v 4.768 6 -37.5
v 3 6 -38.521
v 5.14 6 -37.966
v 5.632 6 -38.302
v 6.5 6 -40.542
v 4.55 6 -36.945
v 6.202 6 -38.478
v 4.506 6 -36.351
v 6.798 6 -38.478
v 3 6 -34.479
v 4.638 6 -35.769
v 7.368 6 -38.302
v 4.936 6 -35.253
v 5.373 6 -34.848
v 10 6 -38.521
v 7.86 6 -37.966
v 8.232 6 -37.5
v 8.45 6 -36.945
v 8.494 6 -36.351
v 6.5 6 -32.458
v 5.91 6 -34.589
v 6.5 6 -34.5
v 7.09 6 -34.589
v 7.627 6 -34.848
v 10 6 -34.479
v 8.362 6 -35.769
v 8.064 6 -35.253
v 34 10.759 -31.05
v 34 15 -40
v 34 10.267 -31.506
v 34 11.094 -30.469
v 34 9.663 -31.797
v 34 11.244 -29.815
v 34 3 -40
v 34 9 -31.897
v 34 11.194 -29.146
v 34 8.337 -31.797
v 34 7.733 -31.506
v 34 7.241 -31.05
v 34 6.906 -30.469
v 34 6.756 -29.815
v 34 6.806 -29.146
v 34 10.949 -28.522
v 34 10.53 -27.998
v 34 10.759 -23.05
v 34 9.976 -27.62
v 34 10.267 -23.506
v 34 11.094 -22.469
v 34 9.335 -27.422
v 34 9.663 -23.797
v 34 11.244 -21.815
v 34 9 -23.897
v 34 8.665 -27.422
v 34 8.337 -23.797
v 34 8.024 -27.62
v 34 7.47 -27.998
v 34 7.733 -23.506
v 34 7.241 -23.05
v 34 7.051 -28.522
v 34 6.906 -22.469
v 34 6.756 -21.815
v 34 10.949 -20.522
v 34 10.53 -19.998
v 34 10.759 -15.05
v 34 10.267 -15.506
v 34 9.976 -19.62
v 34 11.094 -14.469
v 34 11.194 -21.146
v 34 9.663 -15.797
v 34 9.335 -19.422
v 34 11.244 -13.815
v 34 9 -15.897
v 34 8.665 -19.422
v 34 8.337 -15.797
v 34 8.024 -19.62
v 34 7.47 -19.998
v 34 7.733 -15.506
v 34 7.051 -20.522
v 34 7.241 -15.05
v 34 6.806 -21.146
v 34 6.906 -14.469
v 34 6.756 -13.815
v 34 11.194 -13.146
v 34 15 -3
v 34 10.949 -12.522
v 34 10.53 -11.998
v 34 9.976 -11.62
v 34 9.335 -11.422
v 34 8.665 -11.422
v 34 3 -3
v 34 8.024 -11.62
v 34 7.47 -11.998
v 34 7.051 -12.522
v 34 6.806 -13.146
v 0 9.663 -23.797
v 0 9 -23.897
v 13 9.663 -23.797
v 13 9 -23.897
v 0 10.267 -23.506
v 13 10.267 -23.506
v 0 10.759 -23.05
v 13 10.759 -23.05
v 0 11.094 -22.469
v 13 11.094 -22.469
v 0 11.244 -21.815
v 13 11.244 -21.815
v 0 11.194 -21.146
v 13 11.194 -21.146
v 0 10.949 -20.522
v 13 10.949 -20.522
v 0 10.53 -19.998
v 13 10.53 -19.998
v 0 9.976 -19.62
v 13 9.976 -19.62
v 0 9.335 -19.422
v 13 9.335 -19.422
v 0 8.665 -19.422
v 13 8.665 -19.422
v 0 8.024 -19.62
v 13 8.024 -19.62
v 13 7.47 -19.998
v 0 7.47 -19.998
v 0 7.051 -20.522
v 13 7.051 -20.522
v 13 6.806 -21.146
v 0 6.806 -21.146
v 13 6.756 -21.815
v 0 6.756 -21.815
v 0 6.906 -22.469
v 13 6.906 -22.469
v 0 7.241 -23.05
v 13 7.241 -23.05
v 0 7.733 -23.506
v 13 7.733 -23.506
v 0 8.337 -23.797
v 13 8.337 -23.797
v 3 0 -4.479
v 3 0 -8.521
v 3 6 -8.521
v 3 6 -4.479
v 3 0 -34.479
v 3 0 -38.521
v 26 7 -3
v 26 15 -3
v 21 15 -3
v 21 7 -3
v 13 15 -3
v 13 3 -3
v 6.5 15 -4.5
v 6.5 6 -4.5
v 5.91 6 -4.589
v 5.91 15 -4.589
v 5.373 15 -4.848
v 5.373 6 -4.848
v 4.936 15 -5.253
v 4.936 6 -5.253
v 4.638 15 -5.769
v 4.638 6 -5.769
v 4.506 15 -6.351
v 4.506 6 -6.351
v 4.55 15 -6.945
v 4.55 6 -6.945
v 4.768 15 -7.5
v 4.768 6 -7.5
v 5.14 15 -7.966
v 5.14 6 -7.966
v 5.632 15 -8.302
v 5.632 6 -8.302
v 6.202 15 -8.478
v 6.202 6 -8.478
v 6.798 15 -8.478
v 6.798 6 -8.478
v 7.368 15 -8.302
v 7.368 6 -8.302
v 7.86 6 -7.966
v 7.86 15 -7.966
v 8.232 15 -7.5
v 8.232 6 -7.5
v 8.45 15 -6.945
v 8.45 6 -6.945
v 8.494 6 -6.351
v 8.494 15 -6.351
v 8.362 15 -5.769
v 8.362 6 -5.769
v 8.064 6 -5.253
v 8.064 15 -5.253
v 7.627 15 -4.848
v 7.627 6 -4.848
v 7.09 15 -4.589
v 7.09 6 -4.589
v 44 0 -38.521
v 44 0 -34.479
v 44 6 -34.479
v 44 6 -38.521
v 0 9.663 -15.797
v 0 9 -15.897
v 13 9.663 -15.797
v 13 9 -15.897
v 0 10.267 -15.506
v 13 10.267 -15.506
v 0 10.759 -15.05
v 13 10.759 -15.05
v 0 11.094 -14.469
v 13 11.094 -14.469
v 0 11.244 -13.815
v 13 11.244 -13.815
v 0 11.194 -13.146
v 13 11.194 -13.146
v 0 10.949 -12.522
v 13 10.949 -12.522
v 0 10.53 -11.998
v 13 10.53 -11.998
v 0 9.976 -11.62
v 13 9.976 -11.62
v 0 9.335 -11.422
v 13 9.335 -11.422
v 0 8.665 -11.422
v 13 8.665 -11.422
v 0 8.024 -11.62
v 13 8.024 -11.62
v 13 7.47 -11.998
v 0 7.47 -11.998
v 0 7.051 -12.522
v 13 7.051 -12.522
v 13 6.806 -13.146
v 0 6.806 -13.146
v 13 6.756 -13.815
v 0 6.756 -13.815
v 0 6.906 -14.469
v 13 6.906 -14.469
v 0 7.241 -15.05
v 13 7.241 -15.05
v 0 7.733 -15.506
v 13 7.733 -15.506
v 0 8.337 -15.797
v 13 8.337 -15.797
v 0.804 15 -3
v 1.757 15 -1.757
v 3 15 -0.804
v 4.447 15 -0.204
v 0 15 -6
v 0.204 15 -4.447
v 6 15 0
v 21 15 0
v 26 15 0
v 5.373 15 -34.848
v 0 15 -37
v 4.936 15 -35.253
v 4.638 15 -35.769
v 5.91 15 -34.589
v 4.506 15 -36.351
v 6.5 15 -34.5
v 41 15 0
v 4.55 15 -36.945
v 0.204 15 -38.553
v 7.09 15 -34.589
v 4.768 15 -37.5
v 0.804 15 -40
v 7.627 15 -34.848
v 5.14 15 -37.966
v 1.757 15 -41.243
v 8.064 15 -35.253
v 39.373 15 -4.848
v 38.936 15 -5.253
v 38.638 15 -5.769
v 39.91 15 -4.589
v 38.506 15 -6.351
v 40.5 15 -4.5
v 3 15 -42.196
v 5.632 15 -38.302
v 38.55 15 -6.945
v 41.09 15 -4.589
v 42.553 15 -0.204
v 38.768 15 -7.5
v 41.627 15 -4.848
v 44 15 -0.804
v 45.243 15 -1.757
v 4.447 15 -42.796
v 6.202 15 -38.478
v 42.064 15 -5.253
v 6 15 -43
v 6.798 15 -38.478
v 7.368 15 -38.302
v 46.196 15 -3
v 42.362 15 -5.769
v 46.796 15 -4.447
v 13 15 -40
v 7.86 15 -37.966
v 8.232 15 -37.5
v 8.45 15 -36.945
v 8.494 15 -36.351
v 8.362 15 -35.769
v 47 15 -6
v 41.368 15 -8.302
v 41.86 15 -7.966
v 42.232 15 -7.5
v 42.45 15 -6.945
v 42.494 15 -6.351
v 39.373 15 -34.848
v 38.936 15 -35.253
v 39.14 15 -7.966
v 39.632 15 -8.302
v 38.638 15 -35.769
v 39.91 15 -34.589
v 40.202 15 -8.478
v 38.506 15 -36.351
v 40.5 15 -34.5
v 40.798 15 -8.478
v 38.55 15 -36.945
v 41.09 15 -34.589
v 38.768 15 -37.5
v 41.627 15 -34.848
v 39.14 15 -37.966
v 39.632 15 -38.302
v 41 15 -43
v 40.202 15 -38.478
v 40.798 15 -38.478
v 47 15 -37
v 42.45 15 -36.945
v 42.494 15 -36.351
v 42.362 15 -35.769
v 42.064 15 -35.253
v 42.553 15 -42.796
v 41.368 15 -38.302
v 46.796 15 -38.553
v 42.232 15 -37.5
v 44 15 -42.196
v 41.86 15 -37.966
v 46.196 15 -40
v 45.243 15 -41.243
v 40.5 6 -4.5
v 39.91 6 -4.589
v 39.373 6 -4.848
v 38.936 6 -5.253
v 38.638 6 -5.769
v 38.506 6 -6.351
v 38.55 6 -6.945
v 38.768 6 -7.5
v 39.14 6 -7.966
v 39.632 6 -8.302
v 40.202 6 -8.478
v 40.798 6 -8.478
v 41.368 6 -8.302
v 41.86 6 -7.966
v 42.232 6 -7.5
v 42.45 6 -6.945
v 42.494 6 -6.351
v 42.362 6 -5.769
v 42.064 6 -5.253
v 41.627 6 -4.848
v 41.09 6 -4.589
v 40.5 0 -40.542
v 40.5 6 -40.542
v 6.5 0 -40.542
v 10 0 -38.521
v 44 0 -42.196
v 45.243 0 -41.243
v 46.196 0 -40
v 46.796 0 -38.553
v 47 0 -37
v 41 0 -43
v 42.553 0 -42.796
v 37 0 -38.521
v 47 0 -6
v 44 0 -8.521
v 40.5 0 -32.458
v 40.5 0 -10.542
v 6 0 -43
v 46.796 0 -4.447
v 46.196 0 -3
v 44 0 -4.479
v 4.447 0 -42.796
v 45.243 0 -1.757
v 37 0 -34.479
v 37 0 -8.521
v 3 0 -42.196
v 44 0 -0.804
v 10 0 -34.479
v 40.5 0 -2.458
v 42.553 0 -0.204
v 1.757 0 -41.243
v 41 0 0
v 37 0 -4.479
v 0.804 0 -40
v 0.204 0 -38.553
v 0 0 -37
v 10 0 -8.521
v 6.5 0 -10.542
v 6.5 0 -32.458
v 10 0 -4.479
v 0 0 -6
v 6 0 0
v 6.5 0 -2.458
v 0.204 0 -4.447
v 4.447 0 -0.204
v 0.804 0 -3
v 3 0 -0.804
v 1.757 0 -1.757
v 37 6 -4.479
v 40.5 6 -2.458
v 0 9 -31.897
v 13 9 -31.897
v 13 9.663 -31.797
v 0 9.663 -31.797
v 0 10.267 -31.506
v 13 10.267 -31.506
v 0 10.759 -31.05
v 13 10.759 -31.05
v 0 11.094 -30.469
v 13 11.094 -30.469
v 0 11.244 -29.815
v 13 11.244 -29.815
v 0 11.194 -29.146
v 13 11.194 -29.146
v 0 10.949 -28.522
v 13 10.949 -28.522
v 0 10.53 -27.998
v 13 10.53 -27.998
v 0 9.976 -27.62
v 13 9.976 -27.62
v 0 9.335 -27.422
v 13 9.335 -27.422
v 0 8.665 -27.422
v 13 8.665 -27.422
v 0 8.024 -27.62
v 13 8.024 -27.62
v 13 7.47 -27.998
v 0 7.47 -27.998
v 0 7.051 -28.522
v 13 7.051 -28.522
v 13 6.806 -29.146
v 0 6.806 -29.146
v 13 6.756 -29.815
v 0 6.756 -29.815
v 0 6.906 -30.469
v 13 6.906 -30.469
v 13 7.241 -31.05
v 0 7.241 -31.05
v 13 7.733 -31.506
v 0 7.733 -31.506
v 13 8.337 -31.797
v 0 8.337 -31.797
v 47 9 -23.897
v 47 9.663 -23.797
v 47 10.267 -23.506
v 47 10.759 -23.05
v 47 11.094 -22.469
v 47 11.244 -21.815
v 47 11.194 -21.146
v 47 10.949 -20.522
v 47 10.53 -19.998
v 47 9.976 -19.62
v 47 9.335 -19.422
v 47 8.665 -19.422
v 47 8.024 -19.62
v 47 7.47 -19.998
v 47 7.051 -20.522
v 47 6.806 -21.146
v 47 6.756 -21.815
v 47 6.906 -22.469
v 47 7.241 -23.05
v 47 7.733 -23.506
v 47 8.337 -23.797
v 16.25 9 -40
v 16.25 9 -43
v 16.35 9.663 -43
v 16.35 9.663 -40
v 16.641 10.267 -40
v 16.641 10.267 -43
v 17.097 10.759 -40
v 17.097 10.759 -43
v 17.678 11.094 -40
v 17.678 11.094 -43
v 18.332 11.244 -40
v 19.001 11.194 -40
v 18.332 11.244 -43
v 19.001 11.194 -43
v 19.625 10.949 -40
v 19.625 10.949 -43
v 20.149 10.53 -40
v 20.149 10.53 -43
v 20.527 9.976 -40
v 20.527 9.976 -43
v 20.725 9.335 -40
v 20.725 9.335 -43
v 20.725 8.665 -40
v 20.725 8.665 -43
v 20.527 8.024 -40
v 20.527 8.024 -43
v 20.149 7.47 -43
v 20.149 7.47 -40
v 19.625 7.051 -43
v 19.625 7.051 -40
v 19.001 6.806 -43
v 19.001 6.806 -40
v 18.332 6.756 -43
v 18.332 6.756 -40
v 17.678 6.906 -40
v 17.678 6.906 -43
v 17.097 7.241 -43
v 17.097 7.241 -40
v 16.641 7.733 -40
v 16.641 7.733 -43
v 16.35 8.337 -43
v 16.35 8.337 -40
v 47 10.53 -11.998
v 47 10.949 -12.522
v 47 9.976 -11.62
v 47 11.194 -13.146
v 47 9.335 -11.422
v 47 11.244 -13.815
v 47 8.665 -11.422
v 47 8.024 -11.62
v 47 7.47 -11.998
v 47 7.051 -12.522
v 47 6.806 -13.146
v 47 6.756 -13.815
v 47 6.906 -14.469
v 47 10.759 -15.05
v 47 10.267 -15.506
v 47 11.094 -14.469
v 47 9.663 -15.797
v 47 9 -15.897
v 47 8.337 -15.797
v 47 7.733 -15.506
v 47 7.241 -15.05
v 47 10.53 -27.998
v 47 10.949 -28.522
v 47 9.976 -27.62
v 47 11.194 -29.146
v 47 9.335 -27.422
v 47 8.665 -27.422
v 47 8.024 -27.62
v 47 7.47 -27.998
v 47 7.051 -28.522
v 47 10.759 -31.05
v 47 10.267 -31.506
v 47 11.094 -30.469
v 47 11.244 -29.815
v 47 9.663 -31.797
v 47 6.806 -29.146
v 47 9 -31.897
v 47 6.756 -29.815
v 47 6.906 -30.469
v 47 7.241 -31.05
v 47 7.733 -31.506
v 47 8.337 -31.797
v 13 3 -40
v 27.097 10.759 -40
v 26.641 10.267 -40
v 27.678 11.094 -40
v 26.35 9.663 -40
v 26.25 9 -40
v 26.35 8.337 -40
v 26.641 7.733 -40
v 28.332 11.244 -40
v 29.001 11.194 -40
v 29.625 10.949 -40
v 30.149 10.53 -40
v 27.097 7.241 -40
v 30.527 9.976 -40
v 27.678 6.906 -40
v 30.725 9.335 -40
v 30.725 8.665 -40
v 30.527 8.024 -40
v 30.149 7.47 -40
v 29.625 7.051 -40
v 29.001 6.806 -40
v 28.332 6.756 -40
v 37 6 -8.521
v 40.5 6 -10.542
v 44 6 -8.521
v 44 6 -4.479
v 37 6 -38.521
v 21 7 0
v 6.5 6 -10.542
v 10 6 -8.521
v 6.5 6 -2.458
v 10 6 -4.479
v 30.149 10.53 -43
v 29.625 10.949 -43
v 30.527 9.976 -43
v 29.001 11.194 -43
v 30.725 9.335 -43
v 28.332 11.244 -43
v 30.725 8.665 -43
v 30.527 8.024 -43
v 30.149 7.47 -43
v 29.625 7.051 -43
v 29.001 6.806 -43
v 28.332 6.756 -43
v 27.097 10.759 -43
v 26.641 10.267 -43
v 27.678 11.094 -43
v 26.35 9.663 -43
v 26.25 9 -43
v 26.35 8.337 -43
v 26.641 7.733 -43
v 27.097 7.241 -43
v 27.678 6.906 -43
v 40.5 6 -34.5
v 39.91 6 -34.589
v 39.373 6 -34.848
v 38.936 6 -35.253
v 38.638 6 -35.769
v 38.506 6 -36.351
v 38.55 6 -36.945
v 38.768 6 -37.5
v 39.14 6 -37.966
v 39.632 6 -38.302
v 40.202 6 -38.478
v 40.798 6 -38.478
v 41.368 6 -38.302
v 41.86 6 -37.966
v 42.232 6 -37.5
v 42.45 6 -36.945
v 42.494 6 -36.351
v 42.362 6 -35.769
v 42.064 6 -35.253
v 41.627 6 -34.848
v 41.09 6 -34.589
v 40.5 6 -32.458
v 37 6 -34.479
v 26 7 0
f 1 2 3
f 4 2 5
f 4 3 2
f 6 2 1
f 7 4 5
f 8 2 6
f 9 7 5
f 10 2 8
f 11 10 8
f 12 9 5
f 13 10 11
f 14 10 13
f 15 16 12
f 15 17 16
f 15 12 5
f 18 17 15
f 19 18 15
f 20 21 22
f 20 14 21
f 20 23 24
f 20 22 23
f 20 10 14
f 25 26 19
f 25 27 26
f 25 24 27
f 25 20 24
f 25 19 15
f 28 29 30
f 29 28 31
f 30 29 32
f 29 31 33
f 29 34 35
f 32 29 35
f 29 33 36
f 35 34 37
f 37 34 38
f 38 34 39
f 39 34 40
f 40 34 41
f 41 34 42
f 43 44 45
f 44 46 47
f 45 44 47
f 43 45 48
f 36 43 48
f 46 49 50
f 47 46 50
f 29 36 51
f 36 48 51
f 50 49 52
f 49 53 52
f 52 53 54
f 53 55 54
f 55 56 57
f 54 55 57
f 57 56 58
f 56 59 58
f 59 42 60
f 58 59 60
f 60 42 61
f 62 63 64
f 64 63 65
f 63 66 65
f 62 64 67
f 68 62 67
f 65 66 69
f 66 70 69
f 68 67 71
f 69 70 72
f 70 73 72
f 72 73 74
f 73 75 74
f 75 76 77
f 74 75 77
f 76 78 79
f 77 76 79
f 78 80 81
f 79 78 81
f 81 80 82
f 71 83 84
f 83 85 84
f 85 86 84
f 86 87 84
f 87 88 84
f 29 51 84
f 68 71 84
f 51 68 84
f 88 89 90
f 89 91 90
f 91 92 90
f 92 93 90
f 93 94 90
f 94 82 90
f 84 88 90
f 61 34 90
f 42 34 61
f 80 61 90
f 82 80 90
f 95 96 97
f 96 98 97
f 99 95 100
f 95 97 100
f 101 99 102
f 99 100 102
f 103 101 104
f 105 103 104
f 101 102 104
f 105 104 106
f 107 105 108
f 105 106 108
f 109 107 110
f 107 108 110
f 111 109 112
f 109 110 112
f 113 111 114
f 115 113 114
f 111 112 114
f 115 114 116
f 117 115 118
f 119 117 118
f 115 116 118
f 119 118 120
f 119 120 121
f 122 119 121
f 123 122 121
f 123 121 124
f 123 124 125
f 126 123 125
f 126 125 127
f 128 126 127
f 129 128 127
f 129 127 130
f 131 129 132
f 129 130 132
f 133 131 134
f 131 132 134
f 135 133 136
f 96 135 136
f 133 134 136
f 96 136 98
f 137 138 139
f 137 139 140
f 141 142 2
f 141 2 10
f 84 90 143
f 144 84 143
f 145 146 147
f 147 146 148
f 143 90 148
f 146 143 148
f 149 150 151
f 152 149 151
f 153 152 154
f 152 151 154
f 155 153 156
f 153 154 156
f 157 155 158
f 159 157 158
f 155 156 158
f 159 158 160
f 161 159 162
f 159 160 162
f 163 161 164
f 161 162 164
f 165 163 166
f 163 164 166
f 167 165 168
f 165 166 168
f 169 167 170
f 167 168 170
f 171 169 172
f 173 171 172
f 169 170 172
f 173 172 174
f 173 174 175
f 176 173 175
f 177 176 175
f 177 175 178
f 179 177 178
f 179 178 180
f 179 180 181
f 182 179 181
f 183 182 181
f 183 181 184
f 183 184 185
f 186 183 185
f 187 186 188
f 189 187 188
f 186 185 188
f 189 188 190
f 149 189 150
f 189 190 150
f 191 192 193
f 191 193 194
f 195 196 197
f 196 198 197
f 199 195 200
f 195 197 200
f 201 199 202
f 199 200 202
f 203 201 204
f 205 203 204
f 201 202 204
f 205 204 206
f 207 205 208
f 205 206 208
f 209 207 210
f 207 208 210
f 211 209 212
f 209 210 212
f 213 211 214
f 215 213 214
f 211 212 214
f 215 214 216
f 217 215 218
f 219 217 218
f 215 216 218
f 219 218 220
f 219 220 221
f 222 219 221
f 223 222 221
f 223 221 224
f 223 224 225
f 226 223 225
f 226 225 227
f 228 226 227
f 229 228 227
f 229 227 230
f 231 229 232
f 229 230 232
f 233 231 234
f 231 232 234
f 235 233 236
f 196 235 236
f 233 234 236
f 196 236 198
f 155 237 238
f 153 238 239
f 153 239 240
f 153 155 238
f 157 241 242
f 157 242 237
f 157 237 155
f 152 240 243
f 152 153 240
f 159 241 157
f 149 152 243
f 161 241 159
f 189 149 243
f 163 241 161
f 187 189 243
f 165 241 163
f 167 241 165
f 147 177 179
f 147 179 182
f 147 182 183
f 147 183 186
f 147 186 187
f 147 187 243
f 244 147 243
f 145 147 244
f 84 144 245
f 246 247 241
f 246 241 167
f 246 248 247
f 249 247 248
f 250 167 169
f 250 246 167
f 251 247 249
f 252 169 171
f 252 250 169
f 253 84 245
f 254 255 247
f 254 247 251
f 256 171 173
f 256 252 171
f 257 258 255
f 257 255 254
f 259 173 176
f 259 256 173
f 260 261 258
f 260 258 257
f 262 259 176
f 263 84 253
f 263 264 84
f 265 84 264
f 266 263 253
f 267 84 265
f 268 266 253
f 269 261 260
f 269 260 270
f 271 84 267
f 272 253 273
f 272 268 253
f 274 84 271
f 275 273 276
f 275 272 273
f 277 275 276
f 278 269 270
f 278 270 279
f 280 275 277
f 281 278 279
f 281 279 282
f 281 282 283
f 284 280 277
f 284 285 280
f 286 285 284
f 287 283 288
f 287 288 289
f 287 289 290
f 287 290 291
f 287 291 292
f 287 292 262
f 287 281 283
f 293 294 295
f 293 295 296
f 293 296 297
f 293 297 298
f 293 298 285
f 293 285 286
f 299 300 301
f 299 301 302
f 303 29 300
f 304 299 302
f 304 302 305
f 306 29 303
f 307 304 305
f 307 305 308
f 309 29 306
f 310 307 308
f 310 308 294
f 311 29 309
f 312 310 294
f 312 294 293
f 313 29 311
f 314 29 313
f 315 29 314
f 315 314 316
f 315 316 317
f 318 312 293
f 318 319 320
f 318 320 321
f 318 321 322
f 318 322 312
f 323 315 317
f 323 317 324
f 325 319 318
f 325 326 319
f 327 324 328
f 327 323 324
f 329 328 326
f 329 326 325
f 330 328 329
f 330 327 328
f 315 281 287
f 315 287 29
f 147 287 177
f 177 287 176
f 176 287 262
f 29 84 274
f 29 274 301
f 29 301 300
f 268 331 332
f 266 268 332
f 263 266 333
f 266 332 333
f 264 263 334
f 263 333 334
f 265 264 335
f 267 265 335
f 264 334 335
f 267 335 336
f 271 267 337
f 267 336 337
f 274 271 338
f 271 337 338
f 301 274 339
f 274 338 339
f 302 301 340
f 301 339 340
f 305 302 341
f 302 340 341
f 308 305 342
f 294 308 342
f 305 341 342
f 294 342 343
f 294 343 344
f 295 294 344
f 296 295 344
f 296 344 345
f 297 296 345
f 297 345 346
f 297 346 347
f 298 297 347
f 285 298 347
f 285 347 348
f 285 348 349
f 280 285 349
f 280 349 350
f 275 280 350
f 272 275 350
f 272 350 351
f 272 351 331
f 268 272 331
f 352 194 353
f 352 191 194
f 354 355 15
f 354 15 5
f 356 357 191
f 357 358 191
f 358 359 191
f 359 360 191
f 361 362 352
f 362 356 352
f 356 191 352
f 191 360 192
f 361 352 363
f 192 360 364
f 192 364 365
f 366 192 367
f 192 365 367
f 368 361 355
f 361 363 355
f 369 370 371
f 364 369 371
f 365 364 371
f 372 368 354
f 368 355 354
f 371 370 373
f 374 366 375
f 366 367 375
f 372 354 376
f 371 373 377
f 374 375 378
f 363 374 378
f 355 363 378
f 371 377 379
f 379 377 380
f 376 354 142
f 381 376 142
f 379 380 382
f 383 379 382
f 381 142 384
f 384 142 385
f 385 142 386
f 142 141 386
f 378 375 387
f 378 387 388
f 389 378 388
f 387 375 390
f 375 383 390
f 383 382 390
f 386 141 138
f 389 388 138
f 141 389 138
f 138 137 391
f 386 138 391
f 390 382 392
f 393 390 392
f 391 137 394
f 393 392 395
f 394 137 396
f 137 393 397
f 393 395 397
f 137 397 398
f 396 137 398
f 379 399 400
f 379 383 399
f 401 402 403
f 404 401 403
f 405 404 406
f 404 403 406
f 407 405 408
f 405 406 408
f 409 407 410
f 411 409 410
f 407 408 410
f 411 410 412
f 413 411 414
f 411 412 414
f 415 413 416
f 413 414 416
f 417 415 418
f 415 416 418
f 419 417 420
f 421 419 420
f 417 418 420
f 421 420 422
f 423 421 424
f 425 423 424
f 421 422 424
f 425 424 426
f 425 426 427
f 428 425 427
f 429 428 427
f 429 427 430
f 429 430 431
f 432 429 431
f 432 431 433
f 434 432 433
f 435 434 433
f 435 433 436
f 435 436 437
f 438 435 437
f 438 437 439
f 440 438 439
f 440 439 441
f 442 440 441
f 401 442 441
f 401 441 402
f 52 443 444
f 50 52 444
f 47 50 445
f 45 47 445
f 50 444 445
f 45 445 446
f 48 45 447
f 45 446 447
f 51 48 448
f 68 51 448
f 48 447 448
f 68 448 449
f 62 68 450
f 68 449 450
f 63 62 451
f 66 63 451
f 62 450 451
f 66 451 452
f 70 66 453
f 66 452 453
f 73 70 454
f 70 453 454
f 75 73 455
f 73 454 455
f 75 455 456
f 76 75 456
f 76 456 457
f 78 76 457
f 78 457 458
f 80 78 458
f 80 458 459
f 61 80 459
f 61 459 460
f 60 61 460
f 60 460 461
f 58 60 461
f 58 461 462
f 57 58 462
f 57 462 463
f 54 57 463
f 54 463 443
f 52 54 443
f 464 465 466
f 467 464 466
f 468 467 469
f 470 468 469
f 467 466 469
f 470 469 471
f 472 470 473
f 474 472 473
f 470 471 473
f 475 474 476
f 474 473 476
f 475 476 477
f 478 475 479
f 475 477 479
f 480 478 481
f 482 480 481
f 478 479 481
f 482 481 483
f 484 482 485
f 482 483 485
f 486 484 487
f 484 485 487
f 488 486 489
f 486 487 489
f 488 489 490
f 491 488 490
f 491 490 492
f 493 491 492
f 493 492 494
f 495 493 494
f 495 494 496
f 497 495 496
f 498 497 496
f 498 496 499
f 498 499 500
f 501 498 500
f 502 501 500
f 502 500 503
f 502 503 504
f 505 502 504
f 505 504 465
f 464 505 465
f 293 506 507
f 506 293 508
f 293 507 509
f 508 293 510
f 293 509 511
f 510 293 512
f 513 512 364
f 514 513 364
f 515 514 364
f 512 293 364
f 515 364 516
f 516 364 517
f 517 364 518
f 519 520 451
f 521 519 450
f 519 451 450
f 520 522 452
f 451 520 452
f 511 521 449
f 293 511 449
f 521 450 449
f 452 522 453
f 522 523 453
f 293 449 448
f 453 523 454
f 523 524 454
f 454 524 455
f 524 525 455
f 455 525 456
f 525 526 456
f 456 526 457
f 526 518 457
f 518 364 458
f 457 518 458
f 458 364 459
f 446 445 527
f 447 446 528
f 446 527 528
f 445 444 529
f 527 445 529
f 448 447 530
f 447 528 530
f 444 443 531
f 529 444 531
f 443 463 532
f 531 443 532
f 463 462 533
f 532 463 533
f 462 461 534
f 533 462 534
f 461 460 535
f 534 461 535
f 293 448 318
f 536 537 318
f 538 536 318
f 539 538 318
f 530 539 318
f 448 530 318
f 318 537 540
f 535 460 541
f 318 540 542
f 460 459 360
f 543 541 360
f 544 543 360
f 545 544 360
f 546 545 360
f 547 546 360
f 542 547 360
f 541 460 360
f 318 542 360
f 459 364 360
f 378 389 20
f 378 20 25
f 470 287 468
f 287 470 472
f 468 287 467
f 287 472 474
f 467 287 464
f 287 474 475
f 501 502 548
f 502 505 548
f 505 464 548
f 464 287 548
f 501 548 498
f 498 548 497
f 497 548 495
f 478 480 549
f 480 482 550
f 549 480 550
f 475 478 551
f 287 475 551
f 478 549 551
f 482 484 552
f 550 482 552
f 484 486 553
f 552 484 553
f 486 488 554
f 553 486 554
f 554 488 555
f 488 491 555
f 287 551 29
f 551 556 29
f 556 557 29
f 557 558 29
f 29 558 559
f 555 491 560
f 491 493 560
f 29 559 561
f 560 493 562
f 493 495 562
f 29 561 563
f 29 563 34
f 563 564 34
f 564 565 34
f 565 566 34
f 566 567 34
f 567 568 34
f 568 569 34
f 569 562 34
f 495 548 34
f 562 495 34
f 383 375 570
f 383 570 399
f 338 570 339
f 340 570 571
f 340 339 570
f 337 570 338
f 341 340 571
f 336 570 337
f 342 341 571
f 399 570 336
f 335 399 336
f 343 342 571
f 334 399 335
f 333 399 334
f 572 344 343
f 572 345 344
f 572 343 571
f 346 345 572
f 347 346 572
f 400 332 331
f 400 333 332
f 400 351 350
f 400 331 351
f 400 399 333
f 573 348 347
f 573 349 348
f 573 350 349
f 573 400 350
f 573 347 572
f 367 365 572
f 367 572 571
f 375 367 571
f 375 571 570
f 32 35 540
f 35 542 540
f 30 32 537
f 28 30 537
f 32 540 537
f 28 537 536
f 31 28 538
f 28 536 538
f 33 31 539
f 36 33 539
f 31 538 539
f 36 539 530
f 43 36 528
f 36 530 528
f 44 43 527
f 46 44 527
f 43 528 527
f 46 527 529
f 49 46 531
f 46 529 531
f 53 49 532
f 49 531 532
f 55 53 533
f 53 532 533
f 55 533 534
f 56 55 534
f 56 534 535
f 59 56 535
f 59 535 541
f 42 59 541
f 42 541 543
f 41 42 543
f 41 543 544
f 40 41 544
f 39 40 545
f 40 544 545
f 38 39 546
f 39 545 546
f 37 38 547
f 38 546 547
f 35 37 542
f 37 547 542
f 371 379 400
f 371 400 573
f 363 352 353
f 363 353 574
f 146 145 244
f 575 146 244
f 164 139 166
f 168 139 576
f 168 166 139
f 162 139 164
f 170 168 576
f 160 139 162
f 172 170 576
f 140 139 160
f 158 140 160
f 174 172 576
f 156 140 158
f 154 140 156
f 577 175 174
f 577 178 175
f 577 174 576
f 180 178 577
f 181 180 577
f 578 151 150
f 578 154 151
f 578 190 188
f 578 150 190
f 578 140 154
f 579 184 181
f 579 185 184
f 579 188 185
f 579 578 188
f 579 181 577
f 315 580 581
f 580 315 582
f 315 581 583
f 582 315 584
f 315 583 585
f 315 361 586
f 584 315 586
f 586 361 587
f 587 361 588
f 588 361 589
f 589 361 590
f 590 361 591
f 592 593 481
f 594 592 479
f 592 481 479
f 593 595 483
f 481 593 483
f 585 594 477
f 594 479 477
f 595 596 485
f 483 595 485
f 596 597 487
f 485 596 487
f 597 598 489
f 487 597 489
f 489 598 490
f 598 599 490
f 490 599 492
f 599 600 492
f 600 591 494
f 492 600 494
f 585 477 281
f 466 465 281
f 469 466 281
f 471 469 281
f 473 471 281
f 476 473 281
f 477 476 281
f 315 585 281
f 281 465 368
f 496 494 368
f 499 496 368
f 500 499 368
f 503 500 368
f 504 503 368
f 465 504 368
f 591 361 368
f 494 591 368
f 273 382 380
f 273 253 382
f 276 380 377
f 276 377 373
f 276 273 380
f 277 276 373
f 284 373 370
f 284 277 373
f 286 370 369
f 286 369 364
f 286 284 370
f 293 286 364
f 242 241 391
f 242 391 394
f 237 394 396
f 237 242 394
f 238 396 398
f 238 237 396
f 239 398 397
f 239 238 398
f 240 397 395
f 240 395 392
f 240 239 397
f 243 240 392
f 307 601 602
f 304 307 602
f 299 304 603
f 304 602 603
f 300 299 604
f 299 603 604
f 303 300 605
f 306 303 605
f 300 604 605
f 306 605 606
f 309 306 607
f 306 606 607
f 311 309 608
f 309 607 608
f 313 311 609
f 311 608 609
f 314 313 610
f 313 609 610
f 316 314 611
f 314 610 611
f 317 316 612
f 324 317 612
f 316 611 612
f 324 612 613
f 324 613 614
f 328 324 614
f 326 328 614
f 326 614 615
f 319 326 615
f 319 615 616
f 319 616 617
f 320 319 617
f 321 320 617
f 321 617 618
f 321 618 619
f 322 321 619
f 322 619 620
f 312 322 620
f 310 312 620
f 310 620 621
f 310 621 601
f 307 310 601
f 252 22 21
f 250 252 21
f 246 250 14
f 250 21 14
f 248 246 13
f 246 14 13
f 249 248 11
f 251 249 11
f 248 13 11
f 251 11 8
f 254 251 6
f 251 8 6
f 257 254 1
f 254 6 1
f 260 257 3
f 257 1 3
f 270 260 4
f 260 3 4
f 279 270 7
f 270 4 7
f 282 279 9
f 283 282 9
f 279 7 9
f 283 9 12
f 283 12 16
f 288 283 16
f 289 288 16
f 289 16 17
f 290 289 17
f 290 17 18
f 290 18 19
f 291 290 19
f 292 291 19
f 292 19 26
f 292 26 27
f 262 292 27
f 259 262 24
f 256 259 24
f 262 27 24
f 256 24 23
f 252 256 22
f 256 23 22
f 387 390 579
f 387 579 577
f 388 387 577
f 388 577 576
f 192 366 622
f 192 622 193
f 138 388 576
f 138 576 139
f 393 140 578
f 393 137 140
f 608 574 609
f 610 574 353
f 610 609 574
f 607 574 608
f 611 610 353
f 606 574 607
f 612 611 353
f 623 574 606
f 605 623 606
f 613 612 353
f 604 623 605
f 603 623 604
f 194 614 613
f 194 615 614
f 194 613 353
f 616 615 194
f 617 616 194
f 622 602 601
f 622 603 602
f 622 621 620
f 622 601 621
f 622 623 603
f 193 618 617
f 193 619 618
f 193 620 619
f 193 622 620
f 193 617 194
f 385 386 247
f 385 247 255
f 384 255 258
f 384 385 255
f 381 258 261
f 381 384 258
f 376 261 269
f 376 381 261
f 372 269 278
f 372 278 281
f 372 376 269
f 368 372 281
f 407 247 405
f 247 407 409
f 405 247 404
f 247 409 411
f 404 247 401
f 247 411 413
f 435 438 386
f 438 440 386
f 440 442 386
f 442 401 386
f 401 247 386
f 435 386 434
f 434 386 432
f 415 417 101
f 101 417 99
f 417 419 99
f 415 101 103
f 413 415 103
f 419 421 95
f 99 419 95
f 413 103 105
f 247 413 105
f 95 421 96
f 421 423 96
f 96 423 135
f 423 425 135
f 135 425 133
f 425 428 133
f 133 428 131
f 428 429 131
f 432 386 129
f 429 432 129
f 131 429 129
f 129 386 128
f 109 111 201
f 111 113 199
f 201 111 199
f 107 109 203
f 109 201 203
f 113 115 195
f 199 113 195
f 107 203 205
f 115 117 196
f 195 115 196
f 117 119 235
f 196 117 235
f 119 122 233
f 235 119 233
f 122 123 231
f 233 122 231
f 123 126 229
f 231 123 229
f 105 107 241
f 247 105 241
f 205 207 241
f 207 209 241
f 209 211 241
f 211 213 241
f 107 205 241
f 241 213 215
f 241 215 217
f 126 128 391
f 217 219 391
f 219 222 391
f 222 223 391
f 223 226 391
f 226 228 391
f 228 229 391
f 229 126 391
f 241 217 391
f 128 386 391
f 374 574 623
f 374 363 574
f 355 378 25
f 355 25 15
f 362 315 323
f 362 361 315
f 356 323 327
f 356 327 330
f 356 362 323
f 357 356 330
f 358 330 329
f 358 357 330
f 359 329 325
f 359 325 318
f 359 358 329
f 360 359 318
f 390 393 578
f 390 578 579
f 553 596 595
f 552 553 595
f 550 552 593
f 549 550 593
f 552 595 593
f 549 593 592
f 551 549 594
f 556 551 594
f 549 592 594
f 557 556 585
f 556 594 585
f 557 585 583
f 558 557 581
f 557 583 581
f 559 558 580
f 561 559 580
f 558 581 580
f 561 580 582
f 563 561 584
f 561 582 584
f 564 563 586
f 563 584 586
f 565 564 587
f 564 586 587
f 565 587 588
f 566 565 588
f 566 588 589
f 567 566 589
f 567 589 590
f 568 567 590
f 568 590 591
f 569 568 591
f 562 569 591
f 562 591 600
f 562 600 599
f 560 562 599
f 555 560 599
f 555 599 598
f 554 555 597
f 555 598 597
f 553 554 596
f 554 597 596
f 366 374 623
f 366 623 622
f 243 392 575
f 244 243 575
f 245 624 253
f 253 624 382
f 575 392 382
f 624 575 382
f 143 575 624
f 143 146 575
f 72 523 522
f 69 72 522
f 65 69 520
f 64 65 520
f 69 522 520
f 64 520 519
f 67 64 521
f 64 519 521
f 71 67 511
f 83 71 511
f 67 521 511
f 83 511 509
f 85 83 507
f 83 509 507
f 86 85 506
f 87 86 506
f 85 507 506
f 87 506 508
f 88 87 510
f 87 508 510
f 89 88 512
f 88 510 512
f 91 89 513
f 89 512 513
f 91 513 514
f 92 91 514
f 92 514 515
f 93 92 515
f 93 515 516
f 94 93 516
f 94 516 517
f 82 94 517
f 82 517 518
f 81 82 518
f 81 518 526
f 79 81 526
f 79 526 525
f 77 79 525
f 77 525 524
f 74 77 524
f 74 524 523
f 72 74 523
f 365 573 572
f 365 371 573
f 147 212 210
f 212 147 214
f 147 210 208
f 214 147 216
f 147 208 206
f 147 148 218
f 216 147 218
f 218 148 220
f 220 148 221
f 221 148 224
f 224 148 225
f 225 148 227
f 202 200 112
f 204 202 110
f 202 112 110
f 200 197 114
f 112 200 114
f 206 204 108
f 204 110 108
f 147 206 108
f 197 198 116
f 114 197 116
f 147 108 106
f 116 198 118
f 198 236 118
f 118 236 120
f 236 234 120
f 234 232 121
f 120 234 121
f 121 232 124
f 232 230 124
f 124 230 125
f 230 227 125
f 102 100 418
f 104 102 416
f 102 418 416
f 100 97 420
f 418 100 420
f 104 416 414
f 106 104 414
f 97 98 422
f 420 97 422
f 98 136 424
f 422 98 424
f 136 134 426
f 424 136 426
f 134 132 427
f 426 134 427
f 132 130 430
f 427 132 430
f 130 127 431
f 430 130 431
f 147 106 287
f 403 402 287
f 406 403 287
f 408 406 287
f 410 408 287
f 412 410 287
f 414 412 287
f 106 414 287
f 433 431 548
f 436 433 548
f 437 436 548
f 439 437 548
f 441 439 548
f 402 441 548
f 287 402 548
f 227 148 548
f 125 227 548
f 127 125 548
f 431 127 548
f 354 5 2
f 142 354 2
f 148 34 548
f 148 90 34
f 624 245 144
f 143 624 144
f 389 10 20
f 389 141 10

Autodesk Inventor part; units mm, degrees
ref_plane "YZ Plane" through (0, 0, 0) normal (1, 0, 0) x (0, 1, 0)
ref_plane "XZ Plane" through (0, 0, 0) normal (0, 1, 0) x (-1, 0, 0)
ref_plane "XY Plane" through (0, 0, 0) normal (0, 0, 1) x (1, 0, 0)
sketch "Sketch1" plane through (0, 0, 0) normal (0, 1, 0) x (-1, 0, 0)
  line L0 (0, 0) -> (-47, 0)
  line L1 (-47, 0) -> (-47, -43)
  line L2 (-47, -43) -> (0, -43)
  line L3 (0, -43) -> (0, 0)
  line L4 (-13, -40) -> (-34, -40) construction
  line L5 (-34, -40) -> (-34, -3) construction
  line L6 (-34, -3) -> (-13, -3) construction
  line L7 (-13, -3) -> (-13, -40) construction
  point P0 (-23.5, -40)
  point P1 (-23.5, -43)
  point P2 (-13, -21.5)
  point P3 (0, -21.5)
  dimension "d2" = 21
  dimension "d3" = 37
  dimension "d11" = 13
  dimension "d12" = 3
extrude "Extrusion1" add sketch "Sketch1" along normal blind 3
sketch "Sketch2" plane through (0, 3, 0) normal (0, 1, 0) x (1, 0, 0)
  line L0 (0, 0) -> (47, 0) projected
  line L1 (47, 0) -> (47, 43) projected
  line L2 (47, 43) -> (0, 43) projected
  line L3 (0, 43) -> (0, 0) projected
  line L4 (13, 40) -> (34, 40)
  line L5 (34, 40) -> (34, 3)
  line L6 (34, 3) -> (13, 3)
  line L7 (13, 3) -> (13, 40)
  point P0 (13, 21.5)
  point P1 (0, 21.5)
  point P2 (23.5, 40)
  point P3 (23.5, 43)
  dimension "d15" = 37
  dimension "d16" = 21
extrude "Extrusion2" add sketch "Sketch2" along normal blind 12
sketch "Sketch4" plane through (0, 15, 0) normal (0, 1, 0) x (1, 0, 0)
  line L0 (34, 3) -> (13, 3) projected
  line L1 (0, 0) -> (47, 0) projected
  line L2 (26, 3) -> (21, 3)
  line L3 (21, 3) -> (21, 0)
  line L4 (21, 0) -> (26, 0)
  line L5 (26, 0) -> (26, 3)
  point P0 (23.5, 3)
  point P1 (23.5, 3)
  dimension "d19" = 5
extrude "Extrusion3" cut sketch "Sketch4" against normal blind 8
sketch "Sketch5" plane through (0, 15, 0) normal (0, 1, 0) x (1, 0, 0)
  line L0 (47, 43) -> (0, 43) projected
  line L1 (0, 43) -> (0, 0) projected
  line L2 (6.5, 36.5) -> (40.5, 36.5) construction
  line L3 (40.5, 36.5) -> (40.5, 6.5) construction
  line L4 (40.5, 6.5) -> (6.5, 6.5) construction
  line L5 (6.5, 6.5) -> (6.5, 36.5) construction
  point P0 (6.5, 21.5)
  point P1 (0, 21.5)
  point P2 (23.5, 36.5)
  point P3 (23.5, 43)
  dimension "d22" = 6.5
  dimension "d23" = 6.5
hole "Hole1" at (6.5, 15, -36.5) at (6.5, 15, -6.5) at (40.5, 15, -6.5) at (40.5, 15, -36.5) direction (0, -1, 0) diameter 4 end through all
sketch "Sketch7" plane through (47, 0, 0) normal (1, 0, 0) x (0, 0, -1)
  line L0 (0, 0) -> (0, 15)
  circle A0 centre (21.6469, 9) radius 2.25
  circle A1 centre (29.6469, 9) radius 2.25
  circle A2 centre (13.6469, 9) radius 2.25
  dimension "d42" = 4.5
  dimension "d43" = 8
  dimension "d44" = 8
  dimension "d54" = 15
  dimension "d55" = 9
extrude "Extrusion5" cut sketch "Sketch7" against normal through all
sketch "Sketch8" plane through (47, 0, -43) normal (0, 0, -1) x (-1, 0, 0)
  line L0 (0, 0) -> (47, 0) projected
  line L1 (0, 15) -> (47, 15) projected
  line L2 (23.5, 15) -> (23.5, 0) construction
  circle A0 centre (18.5, 9) radius 2.25
  circle A1 centre (28.5, 9) radius 2.25
  dimension "d47" = 4.5
  dimension "d48" = 4.5
  dimension "d49" = 5
  dimension "d50" = 5
  dimension "d56" = 15
  dimension "d57" = 9
extrude "Extrusion6" cut sketch "Sketch8" against normal up to next
fillet "Fillet2" radius 6 4 edges at (0, 7.5, 0) (47, 7.5, 0) (47, 7.5, -43) (0, 7.5, -43)
sketch "Sketch9" plane through (0, 0, 0) normal (0, -1, 0) x (1, 0, 0)
  circle A0 centre (40.5, -6.5) radius 2 projected
  circle A1 centre (6.5, -36.5) radius 2 projected
  circle A2 centre (6.5, -6.5) radius 2 projected
  circle A3 centre (40.5, -36.5) radius 2 projected
  line L0 (6.5, -10.5415) -> (3, -8.5207)
  line L1 (3, -8.5207) -> (3, -4.4793)
  line L2 (3, -4.4793) -> (6.5, -2.4585)
  line L3 (6.5, -2.4585) -> (10, -4.4793)
  line L4 (10, -4.4793) -> (10, -8.5207)
  line L5 (10, -8.5207) -> (6.5, -10.5415)
  line L6 (10, -38.5207) -> (6.5, -40.5415)
  line L7 (6.5, -40.5415) -> (3, -38.5207)
  line L8 (3, -38.5207) -> (3, -34.4793)
  line L9 (3, -34.4793) -> (6.5, -32.4585)
  line L10 (6.5, -32.4585) -> (10, -34.4793)
  line L11 (10, -34.4793) -> (10, -38.5207)
  line L12 (37, -38.5207) -> (37, -34.4793)
  line L13 (37, -34.4793) -> (40.5, -32.4585)
  line L14 (40.5, -32.4585) -> (44, -34.4793)
  line L15 (44, -34.4793) -> (44, -38.5207)
  line L16 (44, -38.5207) -> (40.5, -40.5415)
  line L17 (40.5, -40.5415) -> (37, -38.5207)
  line L18 (37, -8.5207) -> (37, -4.4793)
  line L19 (37, -4.4793) -> (40.5, -2.4585)
  line L20 (40.5, -2.4585) -> (44, -4.4793)
  line L21 (44, -4.4793) -> (44, -8.5207)
  line L22 (44, -8.5207) -> (40.5, -10.5415)
  line L23 (40.5, -10.5415) -> (37, -8.5207)
  point P0 (0, 0)
  dimension "d58" = 7
extrude "Extrusion7" cut sketch "Sketch9" against normal blind 6
equation "\"d23\" = d22"
equation "\"d44\" = d43"
equation "\"d48\" = d47"
equation "\"d50\" = d49"
properties part number "dht22_case_bottom"
